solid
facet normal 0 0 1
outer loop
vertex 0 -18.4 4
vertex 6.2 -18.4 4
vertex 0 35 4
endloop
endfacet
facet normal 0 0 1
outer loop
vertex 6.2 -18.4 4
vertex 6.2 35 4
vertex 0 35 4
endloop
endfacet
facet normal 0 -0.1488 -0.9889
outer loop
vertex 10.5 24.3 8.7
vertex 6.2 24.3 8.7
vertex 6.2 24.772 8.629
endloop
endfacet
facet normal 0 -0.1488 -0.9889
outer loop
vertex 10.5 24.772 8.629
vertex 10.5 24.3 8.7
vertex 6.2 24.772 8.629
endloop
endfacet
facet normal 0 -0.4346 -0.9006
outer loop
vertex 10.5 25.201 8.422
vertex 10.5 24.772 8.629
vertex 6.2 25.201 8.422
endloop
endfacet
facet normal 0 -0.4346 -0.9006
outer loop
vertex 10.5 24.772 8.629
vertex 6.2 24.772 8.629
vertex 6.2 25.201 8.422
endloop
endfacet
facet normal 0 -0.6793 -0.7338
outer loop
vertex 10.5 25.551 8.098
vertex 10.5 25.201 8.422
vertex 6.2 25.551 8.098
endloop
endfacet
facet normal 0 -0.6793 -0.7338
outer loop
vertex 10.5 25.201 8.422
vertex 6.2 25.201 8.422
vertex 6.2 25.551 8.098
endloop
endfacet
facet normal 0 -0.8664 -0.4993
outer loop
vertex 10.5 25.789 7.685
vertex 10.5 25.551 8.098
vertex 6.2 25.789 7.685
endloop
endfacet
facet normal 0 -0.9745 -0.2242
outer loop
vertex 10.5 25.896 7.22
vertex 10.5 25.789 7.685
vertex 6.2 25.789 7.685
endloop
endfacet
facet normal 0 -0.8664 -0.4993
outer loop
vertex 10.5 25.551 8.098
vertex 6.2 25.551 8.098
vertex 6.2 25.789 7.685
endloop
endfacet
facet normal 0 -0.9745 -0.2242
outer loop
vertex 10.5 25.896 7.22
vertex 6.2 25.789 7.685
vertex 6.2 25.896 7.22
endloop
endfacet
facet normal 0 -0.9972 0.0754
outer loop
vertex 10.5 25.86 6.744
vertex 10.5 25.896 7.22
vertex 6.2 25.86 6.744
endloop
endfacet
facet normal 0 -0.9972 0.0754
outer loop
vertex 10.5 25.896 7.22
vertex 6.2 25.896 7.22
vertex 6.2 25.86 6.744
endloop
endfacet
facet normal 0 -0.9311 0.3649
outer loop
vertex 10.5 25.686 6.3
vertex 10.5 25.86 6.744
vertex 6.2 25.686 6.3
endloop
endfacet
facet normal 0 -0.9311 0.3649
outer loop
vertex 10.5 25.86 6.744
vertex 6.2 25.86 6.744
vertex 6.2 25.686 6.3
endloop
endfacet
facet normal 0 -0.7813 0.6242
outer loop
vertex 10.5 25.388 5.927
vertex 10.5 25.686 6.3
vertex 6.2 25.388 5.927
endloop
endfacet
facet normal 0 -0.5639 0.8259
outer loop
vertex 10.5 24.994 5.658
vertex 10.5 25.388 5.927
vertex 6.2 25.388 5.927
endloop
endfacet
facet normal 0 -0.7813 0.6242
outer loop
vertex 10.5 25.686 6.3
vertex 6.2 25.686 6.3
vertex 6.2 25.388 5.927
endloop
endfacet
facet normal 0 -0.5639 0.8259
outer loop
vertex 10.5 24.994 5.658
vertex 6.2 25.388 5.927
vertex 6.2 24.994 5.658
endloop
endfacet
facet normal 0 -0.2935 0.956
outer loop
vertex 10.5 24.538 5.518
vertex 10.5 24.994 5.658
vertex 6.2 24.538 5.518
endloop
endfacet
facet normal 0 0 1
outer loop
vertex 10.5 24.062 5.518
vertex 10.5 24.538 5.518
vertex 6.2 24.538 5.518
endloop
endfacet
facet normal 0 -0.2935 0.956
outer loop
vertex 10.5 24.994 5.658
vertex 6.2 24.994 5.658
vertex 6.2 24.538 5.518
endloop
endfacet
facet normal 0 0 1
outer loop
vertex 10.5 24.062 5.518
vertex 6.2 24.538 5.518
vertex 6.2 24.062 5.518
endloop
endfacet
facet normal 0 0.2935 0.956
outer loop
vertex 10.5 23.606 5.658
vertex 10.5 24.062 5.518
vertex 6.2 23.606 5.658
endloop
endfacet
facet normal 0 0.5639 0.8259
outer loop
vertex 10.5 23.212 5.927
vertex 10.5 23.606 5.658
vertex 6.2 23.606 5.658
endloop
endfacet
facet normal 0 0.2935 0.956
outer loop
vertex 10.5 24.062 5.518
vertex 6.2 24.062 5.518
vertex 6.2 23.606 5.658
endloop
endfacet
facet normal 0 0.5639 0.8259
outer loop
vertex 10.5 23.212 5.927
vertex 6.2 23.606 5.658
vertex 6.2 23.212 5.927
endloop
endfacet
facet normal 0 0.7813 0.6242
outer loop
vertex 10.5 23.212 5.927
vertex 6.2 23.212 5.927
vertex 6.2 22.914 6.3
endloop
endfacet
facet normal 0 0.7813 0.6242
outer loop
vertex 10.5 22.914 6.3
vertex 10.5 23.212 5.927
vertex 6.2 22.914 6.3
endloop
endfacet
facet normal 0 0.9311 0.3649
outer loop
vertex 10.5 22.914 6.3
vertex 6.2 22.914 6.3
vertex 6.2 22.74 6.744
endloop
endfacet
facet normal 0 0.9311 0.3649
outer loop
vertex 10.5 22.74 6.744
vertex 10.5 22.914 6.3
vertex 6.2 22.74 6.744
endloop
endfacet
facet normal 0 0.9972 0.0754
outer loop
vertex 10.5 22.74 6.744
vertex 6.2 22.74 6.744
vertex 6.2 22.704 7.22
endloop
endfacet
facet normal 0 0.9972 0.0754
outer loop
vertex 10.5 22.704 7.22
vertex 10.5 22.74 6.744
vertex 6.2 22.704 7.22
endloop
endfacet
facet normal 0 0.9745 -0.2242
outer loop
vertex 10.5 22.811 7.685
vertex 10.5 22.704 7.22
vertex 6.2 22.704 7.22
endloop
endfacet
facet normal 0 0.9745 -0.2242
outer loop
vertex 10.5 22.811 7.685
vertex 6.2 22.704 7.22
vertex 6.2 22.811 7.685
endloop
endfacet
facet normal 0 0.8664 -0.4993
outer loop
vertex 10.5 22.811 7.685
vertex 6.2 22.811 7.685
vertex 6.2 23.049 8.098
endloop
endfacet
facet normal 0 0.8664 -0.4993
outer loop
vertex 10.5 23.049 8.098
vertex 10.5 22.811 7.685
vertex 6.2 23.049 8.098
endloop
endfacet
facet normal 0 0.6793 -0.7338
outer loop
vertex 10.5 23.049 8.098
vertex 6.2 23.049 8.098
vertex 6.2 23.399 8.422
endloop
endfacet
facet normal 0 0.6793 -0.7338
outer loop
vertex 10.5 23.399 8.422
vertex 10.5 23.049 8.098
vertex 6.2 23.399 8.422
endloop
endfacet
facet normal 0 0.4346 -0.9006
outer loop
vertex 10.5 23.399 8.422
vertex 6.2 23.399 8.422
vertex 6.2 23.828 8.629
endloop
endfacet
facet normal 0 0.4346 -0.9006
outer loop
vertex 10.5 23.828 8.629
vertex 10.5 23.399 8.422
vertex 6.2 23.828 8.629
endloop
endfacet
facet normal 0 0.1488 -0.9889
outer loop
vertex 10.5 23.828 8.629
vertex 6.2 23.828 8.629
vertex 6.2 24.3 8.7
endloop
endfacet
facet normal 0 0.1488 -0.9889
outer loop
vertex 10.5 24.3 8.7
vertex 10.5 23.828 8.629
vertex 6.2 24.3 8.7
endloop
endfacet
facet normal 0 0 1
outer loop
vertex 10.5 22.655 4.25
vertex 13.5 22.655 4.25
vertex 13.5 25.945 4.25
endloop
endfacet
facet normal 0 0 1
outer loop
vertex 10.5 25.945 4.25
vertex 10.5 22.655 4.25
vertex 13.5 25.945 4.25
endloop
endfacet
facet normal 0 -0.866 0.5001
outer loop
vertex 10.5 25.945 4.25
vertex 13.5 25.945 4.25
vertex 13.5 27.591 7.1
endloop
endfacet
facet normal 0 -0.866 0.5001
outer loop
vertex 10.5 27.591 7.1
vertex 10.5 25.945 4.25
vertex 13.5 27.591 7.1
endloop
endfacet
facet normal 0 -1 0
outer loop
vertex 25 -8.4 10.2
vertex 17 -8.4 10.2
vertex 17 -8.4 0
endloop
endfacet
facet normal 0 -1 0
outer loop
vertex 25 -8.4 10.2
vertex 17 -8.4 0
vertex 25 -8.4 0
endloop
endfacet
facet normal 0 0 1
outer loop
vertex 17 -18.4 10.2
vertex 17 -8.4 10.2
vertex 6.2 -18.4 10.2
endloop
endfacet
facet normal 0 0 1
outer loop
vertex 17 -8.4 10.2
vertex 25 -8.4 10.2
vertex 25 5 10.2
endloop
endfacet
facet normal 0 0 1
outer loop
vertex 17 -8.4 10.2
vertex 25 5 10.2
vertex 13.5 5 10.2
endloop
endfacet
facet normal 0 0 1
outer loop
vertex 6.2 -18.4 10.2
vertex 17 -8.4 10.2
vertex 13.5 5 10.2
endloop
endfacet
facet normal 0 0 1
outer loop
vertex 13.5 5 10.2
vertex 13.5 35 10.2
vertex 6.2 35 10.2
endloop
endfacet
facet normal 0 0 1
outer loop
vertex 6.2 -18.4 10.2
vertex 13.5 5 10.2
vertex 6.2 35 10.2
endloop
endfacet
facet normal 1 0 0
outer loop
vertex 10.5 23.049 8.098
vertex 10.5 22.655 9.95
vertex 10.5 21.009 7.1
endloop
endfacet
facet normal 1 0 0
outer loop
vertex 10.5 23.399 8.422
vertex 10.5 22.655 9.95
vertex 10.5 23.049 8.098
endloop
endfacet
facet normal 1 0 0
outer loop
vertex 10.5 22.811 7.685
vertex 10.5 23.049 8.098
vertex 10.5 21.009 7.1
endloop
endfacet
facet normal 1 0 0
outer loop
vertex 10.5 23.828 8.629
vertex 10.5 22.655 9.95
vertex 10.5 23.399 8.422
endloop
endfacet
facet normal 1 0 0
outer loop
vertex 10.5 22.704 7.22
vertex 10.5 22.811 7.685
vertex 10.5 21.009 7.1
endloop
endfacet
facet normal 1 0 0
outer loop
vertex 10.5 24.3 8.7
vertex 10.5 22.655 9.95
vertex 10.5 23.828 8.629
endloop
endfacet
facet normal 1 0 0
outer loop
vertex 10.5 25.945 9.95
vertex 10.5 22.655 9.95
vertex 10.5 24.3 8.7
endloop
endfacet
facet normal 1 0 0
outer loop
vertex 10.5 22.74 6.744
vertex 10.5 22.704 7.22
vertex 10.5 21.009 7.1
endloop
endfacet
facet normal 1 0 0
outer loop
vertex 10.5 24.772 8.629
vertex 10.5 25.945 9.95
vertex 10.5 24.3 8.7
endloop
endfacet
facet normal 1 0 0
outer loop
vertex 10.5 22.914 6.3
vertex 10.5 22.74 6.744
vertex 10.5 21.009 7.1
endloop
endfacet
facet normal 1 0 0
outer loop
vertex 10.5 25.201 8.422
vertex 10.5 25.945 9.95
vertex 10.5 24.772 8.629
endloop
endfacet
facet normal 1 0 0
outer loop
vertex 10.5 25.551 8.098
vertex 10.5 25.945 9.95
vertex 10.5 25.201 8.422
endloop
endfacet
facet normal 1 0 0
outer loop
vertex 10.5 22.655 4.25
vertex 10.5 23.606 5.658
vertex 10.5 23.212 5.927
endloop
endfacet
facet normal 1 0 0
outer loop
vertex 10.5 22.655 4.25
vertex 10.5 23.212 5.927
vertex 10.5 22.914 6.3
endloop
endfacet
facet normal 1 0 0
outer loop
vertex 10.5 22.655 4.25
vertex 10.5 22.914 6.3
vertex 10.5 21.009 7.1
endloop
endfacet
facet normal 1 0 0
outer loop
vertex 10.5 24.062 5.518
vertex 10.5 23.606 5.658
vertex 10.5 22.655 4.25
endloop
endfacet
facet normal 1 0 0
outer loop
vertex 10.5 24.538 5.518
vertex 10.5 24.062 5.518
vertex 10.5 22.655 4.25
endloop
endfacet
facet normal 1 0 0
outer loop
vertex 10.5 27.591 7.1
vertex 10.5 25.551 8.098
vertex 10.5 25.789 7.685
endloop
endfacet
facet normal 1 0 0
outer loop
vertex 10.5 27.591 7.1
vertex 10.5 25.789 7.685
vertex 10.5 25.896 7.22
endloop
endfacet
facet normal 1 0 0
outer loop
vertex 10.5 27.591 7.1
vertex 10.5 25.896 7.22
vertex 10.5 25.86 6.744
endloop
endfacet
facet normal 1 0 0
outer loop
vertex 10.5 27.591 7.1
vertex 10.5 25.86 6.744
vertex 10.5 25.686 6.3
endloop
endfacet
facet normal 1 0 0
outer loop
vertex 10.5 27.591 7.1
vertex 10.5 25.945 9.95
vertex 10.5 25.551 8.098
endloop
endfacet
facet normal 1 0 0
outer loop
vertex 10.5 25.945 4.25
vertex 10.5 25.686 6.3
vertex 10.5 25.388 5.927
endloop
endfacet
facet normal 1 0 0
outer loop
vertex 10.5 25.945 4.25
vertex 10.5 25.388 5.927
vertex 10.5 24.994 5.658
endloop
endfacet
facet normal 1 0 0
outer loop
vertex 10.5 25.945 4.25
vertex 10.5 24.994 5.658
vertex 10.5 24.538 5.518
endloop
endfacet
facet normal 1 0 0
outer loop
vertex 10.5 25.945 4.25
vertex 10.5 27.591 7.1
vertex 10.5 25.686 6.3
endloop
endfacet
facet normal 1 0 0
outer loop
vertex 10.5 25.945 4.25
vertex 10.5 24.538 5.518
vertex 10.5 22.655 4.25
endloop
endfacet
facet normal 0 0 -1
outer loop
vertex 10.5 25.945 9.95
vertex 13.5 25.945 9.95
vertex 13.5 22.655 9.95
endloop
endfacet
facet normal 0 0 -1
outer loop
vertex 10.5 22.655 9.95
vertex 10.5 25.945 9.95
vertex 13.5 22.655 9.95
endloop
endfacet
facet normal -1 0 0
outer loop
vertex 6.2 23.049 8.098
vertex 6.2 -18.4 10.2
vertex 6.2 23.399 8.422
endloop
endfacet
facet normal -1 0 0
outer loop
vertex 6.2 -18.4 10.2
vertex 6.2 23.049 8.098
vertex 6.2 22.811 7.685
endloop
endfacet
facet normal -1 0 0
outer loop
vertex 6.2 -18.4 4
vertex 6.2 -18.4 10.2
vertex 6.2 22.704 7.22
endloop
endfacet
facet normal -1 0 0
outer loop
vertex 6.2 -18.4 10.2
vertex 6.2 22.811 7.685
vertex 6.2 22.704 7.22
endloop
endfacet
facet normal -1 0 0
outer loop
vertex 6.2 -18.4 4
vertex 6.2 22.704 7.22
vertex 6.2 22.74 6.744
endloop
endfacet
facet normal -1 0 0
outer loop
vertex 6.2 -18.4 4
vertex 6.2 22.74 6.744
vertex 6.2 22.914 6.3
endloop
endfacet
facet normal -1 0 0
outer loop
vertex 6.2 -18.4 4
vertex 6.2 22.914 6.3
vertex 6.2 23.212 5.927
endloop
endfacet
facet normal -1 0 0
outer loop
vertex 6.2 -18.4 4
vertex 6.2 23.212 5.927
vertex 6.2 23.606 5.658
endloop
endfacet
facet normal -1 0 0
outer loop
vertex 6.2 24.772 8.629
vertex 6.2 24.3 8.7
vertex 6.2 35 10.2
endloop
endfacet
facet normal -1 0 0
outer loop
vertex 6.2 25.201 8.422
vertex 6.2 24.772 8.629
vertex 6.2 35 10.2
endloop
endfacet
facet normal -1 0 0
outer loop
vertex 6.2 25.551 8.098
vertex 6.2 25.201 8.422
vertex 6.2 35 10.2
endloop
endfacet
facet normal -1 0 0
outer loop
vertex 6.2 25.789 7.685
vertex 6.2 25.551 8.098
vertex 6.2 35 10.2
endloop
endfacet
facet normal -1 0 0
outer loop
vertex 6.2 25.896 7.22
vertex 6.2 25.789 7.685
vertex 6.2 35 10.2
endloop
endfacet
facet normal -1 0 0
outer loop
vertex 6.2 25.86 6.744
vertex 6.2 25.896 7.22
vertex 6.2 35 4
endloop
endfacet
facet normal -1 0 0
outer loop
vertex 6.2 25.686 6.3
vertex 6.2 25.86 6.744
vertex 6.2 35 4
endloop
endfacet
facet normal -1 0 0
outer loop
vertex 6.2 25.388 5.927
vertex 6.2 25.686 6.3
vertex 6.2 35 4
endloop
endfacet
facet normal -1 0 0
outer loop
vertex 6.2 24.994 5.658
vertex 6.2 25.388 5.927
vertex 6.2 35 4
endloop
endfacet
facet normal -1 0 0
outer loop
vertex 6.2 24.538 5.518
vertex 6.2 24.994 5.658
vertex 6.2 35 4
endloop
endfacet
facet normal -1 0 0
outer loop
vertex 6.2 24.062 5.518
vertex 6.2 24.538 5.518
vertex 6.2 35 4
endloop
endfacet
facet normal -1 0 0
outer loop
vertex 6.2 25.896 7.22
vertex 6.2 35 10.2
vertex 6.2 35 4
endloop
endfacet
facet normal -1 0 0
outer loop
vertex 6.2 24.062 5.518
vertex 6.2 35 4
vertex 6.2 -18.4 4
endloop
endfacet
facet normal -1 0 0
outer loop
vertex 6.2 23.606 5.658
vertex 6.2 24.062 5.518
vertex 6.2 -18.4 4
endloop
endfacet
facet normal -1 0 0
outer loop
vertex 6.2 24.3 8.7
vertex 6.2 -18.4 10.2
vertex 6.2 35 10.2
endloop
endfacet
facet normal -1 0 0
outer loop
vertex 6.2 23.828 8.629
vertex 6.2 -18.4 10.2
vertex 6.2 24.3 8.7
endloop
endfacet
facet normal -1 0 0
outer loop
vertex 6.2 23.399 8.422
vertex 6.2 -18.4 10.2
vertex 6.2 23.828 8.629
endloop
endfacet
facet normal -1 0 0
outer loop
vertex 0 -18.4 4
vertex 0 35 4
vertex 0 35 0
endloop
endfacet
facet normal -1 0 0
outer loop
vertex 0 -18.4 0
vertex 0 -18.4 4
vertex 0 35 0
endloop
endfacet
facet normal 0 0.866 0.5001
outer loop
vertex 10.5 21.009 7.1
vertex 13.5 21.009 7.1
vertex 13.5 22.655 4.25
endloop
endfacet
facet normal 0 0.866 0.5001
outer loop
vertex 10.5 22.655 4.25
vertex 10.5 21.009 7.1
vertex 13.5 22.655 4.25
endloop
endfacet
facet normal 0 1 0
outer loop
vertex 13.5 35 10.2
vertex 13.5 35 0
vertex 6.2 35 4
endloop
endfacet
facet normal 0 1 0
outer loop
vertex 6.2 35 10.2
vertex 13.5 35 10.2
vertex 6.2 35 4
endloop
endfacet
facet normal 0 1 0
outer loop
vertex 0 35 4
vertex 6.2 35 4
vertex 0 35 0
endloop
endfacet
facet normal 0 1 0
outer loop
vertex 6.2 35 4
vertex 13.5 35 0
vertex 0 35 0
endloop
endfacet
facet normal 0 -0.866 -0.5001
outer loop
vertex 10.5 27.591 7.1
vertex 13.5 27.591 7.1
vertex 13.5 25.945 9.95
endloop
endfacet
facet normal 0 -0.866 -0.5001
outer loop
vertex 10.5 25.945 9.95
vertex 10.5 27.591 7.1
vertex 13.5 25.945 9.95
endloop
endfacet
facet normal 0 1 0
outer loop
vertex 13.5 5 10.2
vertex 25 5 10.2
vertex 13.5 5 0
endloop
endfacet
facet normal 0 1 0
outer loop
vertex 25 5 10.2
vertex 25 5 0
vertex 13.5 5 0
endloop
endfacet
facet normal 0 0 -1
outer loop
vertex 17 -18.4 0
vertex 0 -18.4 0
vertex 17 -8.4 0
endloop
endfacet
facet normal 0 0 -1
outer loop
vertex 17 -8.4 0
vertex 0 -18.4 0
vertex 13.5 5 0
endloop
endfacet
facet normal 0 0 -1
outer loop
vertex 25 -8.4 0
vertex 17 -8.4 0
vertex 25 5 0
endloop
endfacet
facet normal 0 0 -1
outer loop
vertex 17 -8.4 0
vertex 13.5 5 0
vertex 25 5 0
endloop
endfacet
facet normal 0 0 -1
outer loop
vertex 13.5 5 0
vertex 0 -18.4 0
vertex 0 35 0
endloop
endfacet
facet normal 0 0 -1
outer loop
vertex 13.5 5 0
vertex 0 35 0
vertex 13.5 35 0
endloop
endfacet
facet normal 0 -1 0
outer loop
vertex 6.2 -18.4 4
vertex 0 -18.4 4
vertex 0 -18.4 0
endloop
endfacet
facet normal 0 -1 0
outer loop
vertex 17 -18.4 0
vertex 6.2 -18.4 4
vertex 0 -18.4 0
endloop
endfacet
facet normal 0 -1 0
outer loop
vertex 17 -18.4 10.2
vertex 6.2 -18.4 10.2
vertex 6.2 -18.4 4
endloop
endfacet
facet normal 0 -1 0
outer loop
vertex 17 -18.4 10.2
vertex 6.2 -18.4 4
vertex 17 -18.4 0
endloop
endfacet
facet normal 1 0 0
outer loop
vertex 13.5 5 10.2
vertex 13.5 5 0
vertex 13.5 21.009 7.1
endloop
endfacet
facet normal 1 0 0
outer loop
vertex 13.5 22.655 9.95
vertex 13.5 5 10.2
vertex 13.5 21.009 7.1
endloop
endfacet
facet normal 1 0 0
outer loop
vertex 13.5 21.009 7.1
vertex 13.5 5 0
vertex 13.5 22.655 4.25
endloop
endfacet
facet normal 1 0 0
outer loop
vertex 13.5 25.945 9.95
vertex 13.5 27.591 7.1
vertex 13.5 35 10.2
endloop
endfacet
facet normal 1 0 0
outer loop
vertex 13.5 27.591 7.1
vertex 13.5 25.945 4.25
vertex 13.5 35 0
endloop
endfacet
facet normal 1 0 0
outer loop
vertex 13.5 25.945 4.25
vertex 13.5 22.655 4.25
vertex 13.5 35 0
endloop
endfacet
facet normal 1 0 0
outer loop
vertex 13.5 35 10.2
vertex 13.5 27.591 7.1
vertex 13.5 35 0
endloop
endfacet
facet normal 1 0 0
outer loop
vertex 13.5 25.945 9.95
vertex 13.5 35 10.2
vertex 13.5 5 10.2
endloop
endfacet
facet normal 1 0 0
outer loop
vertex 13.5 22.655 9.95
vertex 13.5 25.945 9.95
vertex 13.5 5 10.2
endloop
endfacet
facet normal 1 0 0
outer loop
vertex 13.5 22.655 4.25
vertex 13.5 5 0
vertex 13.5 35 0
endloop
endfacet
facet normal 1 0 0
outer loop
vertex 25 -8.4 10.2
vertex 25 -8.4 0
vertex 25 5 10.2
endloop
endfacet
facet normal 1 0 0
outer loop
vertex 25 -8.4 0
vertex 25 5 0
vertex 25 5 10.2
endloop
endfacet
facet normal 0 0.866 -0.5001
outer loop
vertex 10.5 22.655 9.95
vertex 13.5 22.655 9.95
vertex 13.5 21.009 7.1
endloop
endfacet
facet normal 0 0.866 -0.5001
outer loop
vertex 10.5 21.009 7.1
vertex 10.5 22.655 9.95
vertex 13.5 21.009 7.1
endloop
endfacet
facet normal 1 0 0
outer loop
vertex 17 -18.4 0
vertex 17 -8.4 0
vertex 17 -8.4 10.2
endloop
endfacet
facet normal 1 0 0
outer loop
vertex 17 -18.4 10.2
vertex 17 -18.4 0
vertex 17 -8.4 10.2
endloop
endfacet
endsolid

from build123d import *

# Parameters (mm, degrees)
SALIENTE_EXTRUIR1_DEPTH = 4
SALIENTE_EXTRUIR2_DEPTH = 6.2
CORTAR_EXTRUIR1_REACH   = 20.8
CROQUIS3_R              = 1.6
CORTAR_EXTRUIR2_DEPTH   = 3
SALIENTE_EXTRUIR3_DEPTH = 8.4
SALIENTE_EXTRUIR4_DEPTH = 10


with BuildPart() as part:
    # Croquis1 → Saliente-Extruir1 (new body)
    with BuildSketch(Plane.XY):
        Polygon((0, 0), (25, 0), (25, 5), (13.5, 5), (13.5, 35), (0, 35), align=None)
    extrude(amount=SALIENTE_EXTRUIR1_DEPTH)

    # Croquis2 → Saliente-Extruir2 (add)
    with BuildSketch(Plane.XY.offset(4)):
        Polygon((6.2, 35), (6.2, 0), (25, 0), (25, 5), (13.5, 5), (13.5, 35), align=None)
    extrude(amount=SALIENTE_EXTRUIR2_DEPTH)

    # Croquis3 → Cortar-Extruir1 (cut, up to next)
    with BuildSketch(Plane.ZY.offset(-6.2), mode=Mode.PRIVATE) as cortar_extruir1_sk1:
        with Locations((7.1, 24.3)):
            Circle(CROQUIS3_R)
    cortar_extruir1_tool1 = extrude(cortar_extruir1_sk1.sketch, amount=-CORTAR_EXTRUIR1_REACH, mode=Mode.PRIVATE) & part.part
    add(cortar_extruir1_tool1.solids().sort_by_distance((6.2, 24.3, 7.1))[0], mode=Mode.SUBTRACT)

    # Croquis4 → Cortar-Extruir2 (cut)
    with BuildSketch(Plane(origin=(13.5, 0, 0), x_dir=(0, 0, -1), z_dir=(1, 0, 0))):
        Polygon((-7.1, 27.590896534), (-9.95, 25.945448267), (-9.95, 22.654551733), (-7.1, 21.009103466), (-4.25, 22.654551733), (-4.25, 25.945448267), align=None)
    extrude(amount=-CORTAR_EXTRUIR2_DEPTH, mode=Mode.SUBTRACT)

    # Croquis5 → Saliente-Extruir3 (add)
    with BuildSketch(Plane.XZ):
        Polygon((0, 0), (25, 0), (25, 10.2), (6.2, 10.2), (6.2, 4), (0, 4), align=None)
    extrude(amount=SALIENTE_EXTRUIR3_DEPTH)

    # Croquis6 → Saliente-Extruir4 (add)
    with BuildSketch(Plane.XZ.offset(8.4)):
        Polygon((17, 0), (17, 10.2), (6.2, 10.2), (6.2, 4), (0, 4), (0, 0), align=None)
    extrude(amount=SALIENTE_EXTRUIR4_DEPTH)


solid = part.part
